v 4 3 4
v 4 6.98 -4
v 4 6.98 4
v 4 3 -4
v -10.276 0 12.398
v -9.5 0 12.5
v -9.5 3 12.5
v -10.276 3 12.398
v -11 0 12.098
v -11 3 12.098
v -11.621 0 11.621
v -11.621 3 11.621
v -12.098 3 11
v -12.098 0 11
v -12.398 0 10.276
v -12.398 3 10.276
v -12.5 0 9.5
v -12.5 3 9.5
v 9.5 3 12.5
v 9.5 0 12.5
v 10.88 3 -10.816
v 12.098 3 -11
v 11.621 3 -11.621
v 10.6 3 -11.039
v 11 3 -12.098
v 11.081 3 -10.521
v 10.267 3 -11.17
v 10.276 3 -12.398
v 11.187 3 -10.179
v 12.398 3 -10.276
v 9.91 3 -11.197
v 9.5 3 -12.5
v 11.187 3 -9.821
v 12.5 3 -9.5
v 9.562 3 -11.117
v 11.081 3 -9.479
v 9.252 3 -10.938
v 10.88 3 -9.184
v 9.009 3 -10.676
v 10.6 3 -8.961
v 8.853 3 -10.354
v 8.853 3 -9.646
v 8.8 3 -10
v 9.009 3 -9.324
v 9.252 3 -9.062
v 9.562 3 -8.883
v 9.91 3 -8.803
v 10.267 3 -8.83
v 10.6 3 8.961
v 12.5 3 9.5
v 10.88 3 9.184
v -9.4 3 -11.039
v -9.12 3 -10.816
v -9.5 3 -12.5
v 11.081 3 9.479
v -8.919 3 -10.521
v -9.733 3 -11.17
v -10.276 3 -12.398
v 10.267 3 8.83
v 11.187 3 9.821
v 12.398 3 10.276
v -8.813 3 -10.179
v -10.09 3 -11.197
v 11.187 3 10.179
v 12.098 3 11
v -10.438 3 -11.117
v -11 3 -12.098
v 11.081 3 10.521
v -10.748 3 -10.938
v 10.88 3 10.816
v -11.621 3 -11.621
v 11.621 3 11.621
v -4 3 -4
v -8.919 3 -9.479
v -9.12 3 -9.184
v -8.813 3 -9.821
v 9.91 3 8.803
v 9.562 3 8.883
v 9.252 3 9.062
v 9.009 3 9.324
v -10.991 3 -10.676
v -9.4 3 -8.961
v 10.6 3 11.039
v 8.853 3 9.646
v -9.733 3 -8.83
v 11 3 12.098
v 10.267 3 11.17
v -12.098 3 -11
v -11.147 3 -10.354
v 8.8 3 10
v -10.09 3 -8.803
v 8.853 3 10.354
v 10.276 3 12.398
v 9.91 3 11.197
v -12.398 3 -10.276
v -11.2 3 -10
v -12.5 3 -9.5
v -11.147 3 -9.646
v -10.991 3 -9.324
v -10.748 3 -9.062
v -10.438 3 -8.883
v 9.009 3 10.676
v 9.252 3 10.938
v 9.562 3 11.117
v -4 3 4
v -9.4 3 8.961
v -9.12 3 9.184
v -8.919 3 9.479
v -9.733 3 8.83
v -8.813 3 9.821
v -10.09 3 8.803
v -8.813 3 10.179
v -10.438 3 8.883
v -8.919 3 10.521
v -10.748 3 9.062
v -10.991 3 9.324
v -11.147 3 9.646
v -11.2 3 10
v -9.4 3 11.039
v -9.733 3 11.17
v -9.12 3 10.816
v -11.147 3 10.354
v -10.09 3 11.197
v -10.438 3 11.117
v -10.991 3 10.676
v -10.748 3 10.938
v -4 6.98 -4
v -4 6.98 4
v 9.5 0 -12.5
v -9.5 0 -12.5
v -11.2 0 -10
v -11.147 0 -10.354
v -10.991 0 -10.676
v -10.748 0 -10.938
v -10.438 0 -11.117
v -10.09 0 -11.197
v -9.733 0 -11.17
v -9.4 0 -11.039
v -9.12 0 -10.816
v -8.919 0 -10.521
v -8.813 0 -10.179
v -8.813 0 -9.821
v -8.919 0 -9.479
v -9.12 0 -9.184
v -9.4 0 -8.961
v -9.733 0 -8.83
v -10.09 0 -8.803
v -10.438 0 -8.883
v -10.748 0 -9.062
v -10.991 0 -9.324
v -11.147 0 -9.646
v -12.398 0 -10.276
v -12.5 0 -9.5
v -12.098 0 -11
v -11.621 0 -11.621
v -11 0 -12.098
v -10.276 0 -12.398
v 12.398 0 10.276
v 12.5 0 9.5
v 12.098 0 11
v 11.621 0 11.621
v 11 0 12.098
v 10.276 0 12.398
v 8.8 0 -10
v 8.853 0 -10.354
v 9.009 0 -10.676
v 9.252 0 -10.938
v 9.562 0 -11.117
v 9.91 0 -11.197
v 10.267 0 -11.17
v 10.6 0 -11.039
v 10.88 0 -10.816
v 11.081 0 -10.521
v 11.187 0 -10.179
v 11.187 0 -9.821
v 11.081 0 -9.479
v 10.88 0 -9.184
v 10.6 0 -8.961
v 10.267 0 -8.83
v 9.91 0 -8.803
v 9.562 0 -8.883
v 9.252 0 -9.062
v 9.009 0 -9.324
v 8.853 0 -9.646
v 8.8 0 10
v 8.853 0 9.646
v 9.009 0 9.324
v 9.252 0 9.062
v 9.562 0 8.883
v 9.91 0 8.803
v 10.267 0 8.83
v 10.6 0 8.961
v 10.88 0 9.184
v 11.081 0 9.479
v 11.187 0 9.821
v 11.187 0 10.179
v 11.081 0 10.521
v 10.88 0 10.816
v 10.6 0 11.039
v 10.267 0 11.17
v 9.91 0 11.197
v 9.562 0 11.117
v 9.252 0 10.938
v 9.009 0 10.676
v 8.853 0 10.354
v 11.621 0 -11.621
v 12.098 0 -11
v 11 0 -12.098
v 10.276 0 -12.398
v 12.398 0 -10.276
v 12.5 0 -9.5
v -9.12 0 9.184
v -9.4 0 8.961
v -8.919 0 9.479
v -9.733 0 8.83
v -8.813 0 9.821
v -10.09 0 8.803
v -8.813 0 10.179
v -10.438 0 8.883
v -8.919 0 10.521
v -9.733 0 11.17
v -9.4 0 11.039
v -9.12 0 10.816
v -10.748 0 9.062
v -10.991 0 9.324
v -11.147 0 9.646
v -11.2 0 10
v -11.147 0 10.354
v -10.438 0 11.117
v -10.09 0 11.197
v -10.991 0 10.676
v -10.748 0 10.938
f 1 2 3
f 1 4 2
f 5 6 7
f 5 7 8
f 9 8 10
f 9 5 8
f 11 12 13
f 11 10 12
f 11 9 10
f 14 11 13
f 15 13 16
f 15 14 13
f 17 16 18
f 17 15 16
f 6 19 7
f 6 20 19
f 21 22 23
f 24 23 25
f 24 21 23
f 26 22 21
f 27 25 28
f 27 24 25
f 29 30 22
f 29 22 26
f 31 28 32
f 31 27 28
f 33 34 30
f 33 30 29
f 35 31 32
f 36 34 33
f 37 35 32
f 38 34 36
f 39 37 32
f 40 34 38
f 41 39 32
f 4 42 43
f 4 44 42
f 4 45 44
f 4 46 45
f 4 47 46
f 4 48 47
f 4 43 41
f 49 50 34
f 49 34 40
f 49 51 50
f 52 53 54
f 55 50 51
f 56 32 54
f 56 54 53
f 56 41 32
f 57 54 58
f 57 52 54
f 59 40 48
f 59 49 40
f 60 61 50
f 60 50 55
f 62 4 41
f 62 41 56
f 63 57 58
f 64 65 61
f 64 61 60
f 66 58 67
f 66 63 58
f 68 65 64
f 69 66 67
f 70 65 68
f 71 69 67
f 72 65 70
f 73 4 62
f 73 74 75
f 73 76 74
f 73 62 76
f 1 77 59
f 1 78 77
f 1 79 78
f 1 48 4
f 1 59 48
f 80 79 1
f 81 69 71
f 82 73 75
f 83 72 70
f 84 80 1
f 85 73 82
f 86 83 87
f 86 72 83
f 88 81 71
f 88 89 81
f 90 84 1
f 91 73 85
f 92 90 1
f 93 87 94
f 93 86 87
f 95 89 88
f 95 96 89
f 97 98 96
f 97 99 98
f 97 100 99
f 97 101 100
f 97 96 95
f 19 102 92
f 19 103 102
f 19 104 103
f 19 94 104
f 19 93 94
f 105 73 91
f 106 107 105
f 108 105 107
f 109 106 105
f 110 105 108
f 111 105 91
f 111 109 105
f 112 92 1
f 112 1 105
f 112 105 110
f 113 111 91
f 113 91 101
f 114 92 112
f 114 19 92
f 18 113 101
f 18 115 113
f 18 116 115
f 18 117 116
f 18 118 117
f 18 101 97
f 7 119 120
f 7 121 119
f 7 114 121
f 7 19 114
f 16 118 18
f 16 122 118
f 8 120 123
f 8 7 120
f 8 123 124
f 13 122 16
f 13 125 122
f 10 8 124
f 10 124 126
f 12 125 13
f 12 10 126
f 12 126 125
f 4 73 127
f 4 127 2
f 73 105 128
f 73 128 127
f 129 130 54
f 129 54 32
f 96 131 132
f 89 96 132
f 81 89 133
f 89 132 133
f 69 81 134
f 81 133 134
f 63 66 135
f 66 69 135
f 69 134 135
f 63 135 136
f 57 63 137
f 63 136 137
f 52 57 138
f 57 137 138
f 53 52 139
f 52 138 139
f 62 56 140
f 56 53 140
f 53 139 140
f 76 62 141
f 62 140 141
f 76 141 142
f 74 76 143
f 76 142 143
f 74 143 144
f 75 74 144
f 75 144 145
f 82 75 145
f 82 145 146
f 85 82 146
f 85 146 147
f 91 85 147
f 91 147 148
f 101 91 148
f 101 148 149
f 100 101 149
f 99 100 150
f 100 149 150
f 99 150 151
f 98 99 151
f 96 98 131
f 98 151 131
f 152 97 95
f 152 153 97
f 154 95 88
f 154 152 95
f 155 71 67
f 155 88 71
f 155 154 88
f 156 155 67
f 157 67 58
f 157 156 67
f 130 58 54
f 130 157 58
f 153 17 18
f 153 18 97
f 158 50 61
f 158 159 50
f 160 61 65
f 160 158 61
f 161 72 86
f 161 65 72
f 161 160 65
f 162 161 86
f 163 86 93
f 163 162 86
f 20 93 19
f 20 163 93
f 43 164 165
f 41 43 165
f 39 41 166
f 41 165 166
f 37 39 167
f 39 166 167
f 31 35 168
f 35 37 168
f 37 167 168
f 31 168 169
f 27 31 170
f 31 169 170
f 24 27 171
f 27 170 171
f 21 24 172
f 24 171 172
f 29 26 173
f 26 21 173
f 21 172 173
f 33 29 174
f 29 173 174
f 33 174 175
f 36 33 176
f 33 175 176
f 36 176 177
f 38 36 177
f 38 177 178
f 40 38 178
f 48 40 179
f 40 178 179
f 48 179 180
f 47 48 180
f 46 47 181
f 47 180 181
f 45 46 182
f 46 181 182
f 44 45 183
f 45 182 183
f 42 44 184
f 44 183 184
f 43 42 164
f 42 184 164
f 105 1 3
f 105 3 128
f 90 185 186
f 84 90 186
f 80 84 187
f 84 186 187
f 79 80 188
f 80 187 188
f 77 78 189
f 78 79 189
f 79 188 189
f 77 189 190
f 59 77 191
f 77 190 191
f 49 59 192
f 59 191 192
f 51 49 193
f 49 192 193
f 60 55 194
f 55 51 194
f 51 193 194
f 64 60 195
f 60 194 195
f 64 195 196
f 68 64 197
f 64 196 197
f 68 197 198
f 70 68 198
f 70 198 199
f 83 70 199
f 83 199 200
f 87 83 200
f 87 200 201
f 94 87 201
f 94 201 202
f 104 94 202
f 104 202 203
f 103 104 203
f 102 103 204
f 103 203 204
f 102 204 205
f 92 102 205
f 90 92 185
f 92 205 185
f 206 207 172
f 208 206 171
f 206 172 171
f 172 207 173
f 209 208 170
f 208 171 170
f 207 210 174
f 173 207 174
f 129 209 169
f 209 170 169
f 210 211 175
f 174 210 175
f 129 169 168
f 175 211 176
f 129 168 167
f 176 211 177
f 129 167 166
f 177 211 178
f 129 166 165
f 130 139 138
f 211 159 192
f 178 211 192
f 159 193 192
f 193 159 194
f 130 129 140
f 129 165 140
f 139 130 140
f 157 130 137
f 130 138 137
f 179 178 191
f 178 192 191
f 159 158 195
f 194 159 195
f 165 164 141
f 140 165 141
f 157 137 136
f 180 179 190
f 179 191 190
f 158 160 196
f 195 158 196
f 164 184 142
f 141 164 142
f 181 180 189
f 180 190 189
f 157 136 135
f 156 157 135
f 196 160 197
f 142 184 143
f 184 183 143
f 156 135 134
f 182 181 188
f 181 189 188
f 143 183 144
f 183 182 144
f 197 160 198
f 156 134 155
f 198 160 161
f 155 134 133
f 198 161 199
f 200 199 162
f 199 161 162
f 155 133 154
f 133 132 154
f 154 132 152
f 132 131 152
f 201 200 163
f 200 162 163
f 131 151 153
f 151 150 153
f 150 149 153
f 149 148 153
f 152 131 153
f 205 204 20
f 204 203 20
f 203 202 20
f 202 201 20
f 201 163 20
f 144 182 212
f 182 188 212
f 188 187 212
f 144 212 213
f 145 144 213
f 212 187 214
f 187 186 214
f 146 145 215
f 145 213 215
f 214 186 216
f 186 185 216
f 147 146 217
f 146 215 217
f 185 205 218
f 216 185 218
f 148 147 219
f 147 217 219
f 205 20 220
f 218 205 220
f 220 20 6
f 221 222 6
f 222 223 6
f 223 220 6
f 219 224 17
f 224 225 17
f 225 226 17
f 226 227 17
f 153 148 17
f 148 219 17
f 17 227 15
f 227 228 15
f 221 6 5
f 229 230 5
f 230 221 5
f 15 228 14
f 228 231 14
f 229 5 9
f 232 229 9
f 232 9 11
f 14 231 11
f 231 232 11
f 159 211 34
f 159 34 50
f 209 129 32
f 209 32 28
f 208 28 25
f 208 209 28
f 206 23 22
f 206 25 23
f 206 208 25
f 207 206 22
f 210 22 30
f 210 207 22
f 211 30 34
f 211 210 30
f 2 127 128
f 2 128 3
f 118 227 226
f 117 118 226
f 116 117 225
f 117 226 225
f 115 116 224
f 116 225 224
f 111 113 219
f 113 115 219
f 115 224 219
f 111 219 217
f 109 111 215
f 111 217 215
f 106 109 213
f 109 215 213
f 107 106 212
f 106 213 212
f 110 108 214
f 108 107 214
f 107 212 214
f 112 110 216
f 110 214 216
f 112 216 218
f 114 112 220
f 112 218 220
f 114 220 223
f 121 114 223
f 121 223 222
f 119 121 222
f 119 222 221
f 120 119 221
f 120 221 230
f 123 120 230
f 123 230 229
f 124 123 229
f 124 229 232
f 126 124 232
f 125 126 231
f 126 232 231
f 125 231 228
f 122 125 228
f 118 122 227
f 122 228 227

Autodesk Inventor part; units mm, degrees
ref_plane "YZ Plane" through (0, 0, 0) normal (1, 0, 0) x (0, 1, 0)
ref_plane "XZ Plane" through (0, 0, 0) normal (0, 1, 0) x (-1, 0, 0)
ref_plane "XY Plane" through (0, 0, 0) normal (0, 0, 1) x (1, 0, 0)
sketch "Sketch1" plane through (0, 0, 0) normal (0, 1, 0) x (-1, 0, 0)
  line L0 (-9.5, 12.5) -> (9.5, 12.5)
  line L1 (12.5, 9.5) -> (12.5, -9.5)
  line L2 (9.5, -12.5) -> (-9.5, -12.5)
  line L3 (-12.5, -9.5) -> (-12.5, 9.5)
  line L4 (-12.5, 12.5) -> (12.5, -12.5) construction
  line L5 (12.5, 12.5) -> (-12.5, -12.5) construction
  line L6 (-10, -10) -> (10, -10) construction
  line L7 (10, -10) -> (10, 10) construction
  line L8 (10, 10) -> (-10, 10) construction
  line L9 (-10, 10) -> (-10, -10) construction
  line L10 (-10, -10) -> (10, 10) construction
  line L11 (10, -10) -> (-10, 10) construction
  circle A0 centre (10, 10) radius 1.2
  circle A1 centre (10, -10) radius 1.2
  circle A2 centre (-10, 10) radius 1.2
  circle A3 centre (-10, -10) radius 1.2
  arc A4 (12.5, 9.5) -> (9.5, 12.5) centre (9.5, 9.5) ccw
  arc A5 (9.5, -12.5) -> (12.5, -9.5) centre (9.5, -9.5) ccw
  arc A6 (-9.5, 12.5) -> (-12.5, 9.5) centre (-9.5, 9.5) ccw
  arc A7 (-12.5, -9.5) -> (-9.5, -12.5) centre (-9.5, -9.5) ccw
  point P0 (0, 0)
  dimension "d0" = 25
  dimension "d1" = 25
  dimension "d2" = 20
  dimension "d3" = 20
  dimension "d4" = 2.4
  dimension "d7" = 20
  dimension "d10" = 20
  dimension "d13" = 3
extrude "Extrusion1" add sketch "Sketch1" along normal blind 3
sketch "Sketch2" plane through (0, 3, 0) normal (0, 1, 0) x (1, 0, 0)
  line L0 (4, -4) -> (-4, -4)
  line L1 (-4, -4) -> (-4, 4)
  line L2 (-4, 4) -> (4, 4)
  line L3 (4, 4) -> (4, -4)
  line L4 (4, -4) -> (-4, 4) construction
  line L5 (-4, -4) -> (4, 4) construction
  point P0 (0, 0)
  dimension "d16" = 8
  dimension "d17" = 8
extrude "Extrusion2" add sketch "Sketch2" along normal blind 3.98
equation "\"d4\" = hole"
equation "\"hole\" = 2.4"
properties part number "camera"
